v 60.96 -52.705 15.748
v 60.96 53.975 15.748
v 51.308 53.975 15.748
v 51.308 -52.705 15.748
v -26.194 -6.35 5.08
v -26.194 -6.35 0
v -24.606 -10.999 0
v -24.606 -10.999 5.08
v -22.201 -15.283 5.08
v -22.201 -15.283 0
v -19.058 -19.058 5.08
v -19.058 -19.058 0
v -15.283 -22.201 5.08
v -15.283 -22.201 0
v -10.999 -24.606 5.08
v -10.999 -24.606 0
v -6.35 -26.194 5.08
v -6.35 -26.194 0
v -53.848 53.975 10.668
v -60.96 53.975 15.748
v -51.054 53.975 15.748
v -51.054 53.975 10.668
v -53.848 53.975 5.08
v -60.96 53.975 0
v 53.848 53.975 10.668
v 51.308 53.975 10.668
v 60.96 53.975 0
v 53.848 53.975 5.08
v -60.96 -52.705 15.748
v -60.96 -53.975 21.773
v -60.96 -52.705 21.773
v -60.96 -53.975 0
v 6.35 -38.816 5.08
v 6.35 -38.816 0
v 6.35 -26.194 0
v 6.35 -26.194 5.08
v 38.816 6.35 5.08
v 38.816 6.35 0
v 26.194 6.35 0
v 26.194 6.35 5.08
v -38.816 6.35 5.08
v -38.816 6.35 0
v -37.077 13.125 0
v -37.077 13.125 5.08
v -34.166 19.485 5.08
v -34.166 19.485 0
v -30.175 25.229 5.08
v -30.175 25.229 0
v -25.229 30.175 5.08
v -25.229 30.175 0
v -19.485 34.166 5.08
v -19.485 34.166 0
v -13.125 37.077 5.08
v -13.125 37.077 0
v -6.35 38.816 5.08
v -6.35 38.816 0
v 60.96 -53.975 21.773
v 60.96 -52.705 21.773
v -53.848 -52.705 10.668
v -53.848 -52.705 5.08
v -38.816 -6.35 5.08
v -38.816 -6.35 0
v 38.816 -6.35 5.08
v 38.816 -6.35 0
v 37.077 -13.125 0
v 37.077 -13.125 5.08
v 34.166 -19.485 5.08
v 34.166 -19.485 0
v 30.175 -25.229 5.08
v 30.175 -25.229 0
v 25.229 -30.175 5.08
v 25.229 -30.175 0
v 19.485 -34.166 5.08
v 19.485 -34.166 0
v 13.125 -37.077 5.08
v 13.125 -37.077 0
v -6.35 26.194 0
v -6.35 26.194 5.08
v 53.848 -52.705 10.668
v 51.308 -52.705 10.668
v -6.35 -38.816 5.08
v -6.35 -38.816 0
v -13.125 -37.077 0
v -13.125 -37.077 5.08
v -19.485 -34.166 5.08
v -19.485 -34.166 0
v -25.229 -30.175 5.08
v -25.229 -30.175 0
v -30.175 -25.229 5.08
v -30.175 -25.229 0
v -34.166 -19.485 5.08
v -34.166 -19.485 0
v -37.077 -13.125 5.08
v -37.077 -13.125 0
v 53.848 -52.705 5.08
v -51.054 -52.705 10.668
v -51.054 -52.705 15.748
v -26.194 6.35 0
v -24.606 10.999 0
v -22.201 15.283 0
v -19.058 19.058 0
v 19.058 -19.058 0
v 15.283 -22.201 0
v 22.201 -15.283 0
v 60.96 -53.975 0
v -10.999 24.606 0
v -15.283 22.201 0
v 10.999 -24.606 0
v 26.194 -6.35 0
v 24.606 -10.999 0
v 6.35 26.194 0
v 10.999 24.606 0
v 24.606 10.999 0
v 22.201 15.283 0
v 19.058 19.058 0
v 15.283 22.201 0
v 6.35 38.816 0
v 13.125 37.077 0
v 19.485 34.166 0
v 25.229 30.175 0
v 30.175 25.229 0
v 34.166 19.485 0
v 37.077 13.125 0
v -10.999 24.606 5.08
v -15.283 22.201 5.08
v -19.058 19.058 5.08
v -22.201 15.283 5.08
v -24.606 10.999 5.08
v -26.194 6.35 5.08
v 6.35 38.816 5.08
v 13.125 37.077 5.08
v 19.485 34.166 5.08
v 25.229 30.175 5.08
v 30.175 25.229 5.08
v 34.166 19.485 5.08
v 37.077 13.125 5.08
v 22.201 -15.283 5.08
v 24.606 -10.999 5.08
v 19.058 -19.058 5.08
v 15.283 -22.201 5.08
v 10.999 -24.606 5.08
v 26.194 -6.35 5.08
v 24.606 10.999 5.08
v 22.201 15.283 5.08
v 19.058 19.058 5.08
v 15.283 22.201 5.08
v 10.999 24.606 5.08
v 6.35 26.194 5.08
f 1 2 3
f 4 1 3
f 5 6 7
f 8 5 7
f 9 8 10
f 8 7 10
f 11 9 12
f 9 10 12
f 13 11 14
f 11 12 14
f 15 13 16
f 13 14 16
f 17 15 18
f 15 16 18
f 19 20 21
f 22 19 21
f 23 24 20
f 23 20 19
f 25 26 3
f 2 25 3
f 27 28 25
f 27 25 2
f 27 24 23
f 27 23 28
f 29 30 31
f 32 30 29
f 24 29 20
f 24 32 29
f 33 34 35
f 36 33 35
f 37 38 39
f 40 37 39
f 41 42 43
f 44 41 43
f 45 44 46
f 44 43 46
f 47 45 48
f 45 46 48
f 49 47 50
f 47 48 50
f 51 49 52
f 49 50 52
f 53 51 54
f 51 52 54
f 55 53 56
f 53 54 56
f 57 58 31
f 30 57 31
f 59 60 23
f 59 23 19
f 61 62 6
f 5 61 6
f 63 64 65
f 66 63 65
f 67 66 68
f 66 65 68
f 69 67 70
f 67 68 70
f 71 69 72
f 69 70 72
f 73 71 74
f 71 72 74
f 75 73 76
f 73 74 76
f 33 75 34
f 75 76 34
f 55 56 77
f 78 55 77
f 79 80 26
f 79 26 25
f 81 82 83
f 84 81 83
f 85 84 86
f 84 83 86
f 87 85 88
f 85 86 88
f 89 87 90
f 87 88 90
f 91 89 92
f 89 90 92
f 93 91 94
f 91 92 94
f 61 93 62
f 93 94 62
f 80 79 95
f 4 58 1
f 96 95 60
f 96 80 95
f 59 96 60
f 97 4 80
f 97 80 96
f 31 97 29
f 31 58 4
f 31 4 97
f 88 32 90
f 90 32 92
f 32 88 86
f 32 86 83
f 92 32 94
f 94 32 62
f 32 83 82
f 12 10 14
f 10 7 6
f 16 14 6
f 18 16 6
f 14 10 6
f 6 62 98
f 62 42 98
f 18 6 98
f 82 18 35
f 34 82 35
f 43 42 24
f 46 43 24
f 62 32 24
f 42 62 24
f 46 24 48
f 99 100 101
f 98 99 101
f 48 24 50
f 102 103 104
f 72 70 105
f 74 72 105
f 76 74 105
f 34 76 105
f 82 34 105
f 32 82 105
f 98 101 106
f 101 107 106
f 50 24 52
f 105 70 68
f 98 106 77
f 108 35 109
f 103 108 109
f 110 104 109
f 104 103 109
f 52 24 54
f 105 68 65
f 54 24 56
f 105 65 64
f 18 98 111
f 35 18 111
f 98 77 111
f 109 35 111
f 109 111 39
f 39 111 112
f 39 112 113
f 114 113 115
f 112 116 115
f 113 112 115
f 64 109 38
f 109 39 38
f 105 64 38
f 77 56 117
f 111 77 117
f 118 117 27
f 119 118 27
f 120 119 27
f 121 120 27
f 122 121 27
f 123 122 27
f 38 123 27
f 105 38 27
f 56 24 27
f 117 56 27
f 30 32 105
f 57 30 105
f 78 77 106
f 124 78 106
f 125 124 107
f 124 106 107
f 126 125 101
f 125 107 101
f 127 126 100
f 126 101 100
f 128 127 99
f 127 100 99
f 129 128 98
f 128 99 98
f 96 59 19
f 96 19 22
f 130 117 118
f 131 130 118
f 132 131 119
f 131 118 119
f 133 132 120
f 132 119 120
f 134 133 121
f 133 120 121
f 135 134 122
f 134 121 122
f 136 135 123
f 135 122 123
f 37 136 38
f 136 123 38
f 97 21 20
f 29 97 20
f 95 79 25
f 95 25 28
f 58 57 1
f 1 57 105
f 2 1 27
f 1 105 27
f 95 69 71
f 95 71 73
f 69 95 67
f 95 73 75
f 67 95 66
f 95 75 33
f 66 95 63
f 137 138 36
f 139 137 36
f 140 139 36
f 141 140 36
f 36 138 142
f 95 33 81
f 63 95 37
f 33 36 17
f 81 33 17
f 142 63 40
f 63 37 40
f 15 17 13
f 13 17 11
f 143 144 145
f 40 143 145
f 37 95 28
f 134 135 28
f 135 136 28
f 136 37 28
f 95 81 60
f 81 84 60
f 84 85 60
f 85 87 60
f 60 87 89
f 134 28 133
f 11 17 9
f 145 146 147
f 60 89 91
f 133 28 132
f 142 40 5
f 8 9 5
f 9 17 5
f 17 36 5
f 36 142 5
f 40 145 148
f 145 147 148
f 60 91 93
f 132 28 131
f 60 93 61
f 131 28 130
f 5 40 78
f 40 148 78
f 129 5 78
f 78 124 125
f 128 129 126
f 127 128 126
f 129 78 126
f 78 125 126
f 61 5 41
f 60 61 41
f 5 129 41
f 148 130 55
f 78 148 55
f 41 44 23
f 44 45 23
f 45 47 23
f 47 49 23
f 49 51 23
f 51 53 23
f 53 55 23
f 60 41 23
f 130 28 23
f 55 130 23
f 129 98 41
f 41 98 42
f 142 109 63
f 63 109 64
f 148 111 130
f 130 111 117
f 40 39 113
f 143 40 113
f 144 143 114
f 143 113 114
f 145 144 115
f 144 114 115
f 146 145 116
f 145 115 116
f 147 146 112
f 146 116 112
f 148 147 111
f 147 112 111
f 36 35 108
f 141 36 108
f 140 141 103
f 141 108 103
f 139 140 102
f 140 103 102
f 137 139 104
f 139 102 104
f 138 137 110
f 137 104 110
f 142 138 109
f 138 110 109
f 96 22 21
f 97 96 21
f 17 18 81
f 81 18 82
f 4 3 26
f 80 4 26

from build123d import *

# Parameters (mm, degrees)
F0_W      = 121.92
F0_H      = 107.95
F1_DEPTH  = 38.1
F2_W      = 101.854
F2_H      = 101.854
F3_DEPTH  = 30.48
F5_DEPTH  = 25.4
F7_DEPTH  = 106.68
F8_W      = 121.92
F8_H      = 16.3267194241
F9_DEPTH  = 25.4
F10_DEPTH = 25.4


with BuildPart() as f1:
    # F0 (on Top) → F1 (new body)
    with BuildSketch(Plane.XY):
        Rectangle(F0_W, F0_H)
    extrude(amount=F1_DEPTH)

    # F2 (on face) → F3 (cut)
    with BuildSketch(Plane.XY.offset(38.1)):
        Rectangle(F2_W, F2_H)
    extrude(amount=-F3_DEPTH, mode=Mode.SUBTRACT)

    # F4 (on face) → F5 (cut)
    with BuildSketch(Plane(origin=(0, 0, 0), x_dir=(1, 0, 0), z_dir=(0, 0, -1))):
        with BuildLine():
            Line((-6.35, 26.193887236), (-6.35, 38.8158181091))
            ThreePointArc((-6.35, 38.8158181091), (-27.8117801972, 27.8117801972), (-38.8158181091, 6.35))
            Line((-38.8158181091, 6.35), (-26.193887236, 6.35))
            ThreePointArc((-26.193887236, 6.35), (-19.0583607445, 19.0583607445), (-6.35, 26.193887236))
        make_face()
        with BuildLine():
            Line((-26.193887236, -6.35), (-38.8158181091, -6.35))
            ThreePointArc((-38.8158181091, -6.35), (-27.8117801972, -27.8117801972), (-6.35, -38.8158181091))
            Line((-6.35, -38.8158181091), (-6.35, -26.193887236))
            ThreePointArc((-6.35, -26.193887236), (-19.0583607445, -19.0583607445), (-26.193887236, -6.35))
        make_face()
        with BuildLine():
            ThreePointArc((38.8158181091, 6.35), (27.8117801972, 27.8117801972), (6.35, 38.8158181091))
            Line((6.35, 38.8158181091), (6.35, 26.193887236))
            ThreePointArc((6.35, 26.193887236), (19.0583607445, 19.0583607445), (26.193887236, 6.35))
            Line((26.193887236, 6.35), (38.8158181091, 6.35))
        make_face()
        with BuildLine():
            ThreePointArc((26.193887236, -6.35), (19.0583607445, -19.0583607445), (6.35, -26.193887236))
            Line((6.35, -26.193887236), (6.35, -38.8158181091))
            ThreePointArc((6.35, -38.8158181091), (27.8117801972, -27.8117801972), (38.8158181091, -6.35))
            Line((38.8158181091, -6.35), (26.193887236, -6.35))
        make_face()
    extrude(amount=-F5_DEPTH, mode=Mode.SUBTRACT)

    # F6 (on face) → F7 (cut)
    with BuildSketch(Plane(origin=(0, 53.975, 0), x_dir=(-1, 0, 0), z_dir=(0, 1, 0))):
        Polygon((60.96, 15.748), (60.96, 38.1), (-60.96, 38.1), (-60.96, 15.748), (-51.308, 15.748), (-51.308, 10.668), (-53.848, 10.668), (-53.848, 5.08), (53.848, 5.08), (53.848, 10.668), (51.054, 10.668), (51.054, 15.748), align=None)
    extrude(amount=-F7_DEPTH, mode=Mode.SUBTRACT)

    # F8 (on face) → F9 (cut)
    with BuildSketch(Plane(origin=(0, -52.705, 0), x_dir=(-1, 0, 0), z_dir=(0, 1, 0))):
        with Locations((0, 29.9366402879)):
            Rectangle(F8_W, F8_H)
    extrude(amount=-F9_DEPTH, mode=Mode.SUBTRACT)

    # F4 (on face) → F10 (cut)
    with BuildSketch(Plane(origin=(0, 0, 0), x_dir=(1, 0, 0), z_dir=(0, 0, -1))):
        with BuildLine():
            Line((-6.35, 26.193887236), (-6.35, 38.8158181091))
            ThreePointArc((-6.35, 38.8158181091), (-27.8117801972, 27.8117801972), (-38.8158181091, 6.35))
            Line((-38.8158181091, 6.35), (-26.193887236, 6.35))
            ThreePointArc((-26.193887236, 6.35), (-19.0583607445, 19.0583607445), (-6.35, 26.193887236))
        make_face()
        with BuildLine():
            Line((-26.193887236, -6.35), (-38.8158181091, -6.35))
            ThreePointArc((-38.8158181091, -6.35), (-27.8117801972, -27.8117801972), (-6.35, -38.8158181091))
            Line((-6.35, -38.8158181091), (-6.35, -26.193887236))
            ThreePointArc((-6.35, -26.193887236), (-19.0583607445, -19.0583607445), (-26.193887236, -6.35))
        make_face()
        with BuildLine():
            ThreePointArc((38.8158181091, 6.35), (27.8117801972, 27.8117801972), (6.35, 38.8158181091))
            Line((6.35, 38.8158181091), (6.35, 26.193887236))
            ThreePointArc((6.35, 26.193887236), (19.0583607445, 19.0583607445), (26.193887236, 6.35))
            Line((26.193887236, 6.35), (38.8158181091, 6.35))
        make_face()
        with BuildLine():
            ThreePointArc((26.193887236, -6.35), (19.0583607445, -19.0583607445), (6.35, -26.193887236))
            Line((6.35, -26.193887236), (6.35, -38.8158181091))
            ThreePointArc((6.35, -38.8158181091), (27.8117801972, -27.8117801972), (38.8158181091, -6.35))
            Line((38.8158181091, -6.35), (26.193887236, -6.35))
        make_face()
    extrude(amount=-F10_DEPTH, mode=Mode.SUBTRACT)


solid = f1.part
